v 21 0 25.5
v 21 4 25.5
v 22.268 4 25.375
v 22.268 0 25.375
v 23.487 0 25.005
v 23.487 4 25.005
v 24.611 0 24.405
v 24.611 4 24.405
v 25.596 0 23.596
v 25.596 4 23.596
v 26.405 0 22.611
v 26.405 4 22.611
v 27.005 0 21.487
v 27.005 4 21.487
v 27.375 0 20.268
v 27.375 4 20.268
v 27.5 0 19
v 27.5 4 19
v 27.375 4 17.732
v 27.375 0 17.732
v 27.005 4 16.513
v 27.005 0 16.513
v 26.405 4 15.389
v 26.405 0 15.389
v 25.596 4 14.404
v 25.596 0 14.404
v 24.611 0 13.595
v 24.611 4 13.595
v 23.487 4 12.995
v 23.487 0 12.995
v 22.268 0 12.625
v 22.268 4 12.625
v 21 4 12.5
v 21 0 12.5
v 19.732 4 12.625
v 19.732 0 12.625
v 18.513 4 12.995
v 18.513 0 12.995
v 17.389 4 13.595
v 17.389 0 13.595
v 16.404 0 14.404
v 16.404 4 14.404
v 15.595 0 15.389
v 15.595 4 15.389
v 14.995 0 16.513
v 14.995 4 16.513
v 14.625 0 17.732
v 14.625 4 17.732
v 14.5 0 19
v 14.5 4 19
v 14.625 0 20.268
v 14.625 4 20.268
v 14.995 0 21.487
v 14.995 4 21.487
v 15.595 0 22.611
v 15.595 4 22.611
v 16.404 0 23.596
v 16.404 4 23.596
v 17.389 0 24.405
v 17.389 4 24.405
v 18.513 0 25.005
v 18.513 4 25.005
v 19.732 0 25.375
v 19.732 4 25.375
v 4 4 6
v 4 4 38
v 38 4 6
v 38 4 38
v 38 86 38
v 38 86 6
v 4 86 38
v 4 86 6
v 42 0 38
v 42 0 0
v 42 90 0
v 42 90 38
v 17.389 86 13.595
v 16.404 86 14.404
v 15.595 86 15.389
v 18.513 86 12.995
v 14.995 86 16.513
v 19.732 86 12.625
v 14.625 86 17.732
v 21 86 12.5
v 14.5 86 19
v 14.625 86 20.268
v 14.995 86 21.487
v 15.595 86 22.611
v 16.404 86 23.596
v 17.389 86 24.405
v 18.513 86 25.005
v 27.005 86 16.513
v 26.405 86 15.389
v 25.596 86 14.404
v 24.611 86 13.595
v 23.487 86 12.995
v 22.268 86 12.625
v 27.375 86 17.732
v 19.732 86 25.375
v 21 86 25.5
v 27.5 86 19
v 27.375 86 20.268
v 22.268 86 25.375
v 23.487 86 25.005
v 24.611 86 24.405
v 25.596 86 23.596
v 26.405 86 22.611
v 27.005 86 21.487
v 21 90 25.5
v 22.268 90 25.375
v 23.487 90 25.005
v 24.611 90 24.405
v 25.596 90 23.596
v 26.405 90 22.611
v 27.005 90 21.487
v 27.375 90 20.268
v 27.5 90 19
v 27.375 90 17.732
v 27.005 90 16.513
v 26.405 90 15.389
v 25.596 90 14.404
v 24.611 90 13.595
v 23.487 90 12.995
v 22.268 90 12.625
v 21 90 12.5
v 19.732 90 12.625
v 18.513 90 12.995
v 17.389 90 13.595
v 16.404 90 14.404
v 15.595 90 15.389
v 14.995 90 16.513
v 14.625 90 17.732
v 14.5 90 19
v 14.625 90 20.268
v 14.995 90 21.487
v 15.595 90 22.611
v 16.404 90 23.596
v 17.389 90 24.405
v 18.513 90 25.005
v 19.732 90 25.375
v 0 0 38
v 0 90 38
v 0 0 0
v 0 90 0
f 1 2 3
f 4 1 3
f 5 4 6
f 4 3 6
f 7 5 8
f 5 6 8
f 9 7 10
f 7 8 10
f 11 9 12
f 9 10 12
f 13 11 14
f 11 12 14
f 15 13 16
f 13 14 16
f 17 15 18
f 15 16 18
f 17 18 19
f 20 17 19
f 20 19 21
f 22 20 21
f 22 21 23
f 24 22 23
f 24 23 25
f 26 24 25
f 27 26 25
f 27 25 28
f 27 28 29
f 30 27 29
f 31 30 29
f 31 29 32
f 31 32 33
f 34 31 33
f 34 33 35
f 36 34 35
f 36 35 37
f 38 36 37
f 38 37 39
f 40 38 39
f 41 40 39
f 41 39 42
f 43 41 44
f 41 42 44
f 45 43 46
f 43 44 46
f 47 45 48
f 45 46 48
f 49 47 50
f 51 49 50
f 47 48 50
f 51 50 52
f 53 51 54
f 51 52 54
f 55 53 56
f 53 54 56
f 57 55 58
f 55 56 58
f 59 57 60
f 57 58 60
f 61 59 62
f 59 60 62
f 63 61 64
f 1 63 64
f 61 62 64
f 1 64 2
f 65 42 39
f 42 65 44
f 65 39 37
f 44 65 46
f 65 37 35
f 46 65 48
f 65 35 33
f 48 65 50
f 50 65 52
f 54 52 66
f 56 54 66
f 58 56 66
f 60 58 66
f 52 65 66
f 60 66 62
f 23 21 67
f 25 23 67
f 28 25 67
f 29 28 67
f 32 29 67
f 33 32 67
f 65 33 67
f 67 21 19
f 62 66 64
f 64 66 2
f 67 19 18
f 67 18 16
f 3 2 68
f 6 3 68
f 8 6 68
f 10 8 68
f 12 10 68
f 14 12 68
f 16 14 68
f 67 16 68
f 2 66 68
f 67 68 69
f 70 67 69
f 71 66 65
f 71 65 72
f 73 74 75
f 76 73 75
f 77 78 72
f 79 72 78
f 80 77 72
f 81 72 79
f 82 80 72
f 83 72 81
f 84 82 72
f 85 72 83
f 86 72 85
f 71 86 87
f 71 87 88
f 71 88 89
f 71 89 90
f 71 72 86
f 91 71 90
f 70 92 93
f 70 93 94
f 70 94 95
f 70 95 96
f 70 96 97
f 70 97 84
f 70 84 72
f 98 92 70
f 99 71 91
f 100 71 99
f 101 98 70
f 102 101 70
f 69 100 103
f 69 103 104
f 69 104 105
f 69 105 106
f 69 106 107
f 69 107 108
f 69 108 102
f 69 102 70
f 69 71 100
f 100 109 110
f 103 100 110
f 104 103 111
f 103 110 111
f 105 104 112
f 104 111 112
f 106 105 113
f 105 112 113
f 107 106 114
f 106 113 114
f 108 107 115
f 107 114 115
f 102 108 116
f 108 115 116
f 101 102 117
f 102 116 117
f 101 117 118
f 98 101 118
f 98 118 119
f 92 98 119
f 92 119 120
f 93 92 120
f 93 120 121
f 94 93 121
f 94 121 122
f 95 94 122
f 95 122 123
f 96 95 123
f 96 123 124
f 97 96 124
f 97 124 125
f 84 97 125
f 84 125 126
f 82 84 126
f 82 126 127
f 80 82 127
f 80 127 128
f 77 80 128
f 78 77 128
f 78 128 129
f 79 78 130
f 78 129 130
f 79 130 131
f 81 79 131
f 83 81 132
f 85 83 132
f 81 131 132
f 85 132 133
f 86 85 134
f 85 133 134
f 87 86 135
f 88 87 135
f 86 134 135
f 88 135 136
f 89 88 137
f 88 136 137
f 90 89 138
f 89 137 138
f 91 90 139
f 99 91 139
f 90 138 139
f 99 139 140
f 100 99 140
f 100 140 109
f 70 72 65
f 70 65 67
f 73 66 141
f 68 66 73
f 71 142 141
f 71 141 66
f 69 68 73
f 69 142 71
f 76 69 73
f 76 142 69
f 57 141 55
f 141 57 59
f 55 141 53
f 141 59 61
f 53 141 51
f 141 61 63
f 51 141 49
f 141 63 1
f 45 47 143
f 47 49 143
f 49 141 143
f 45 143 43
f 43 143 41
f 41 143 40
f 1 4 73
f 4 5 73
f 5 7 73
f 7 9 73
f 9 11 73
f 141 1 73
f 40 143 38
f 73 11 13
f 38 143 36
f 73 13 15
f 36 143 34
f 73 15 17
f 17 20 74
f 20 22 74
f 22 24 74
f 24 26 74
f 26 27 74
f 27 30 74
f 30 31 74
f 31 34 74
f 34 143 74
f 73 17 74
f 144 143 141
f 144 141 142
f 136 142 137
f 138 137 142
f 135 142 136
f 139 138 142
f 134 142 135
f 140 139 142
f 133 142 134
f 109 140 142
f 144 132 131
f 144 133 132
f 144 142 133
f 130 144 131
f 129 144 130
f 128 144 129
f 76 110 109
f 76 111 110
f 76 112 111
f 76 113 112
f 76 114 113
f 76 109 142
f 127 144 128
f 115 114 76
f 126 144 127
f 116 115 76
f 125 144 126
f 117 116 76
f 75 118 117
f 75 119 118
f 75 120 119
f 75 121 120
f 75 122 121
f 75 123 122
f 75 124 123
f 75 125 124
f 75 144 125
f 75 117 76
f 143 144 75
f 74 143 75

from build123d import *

# Parameters (mm, degrees)
SKETCH_1_W                = 42
SKETCH_1_H                = 90
HOUSING_ENVELOPE_DEPTH    = 38
SKETCH_2_W                = 34
SKETCH_2_H                = 82
FRONT_ACCESS_WINDOW_DEPTH = 32
SKETCH_3_R                = 6.5
AXIAL_PASSAGE_DEPTH       = 107.339080304


with BuildPart() as part:
    # 草图1 → Housing_envelope (new body)
    with BuildSketch(Plane.XY):
        with Locations((21, 45)):
            Rectangle(SKETCH_1_W, SKETCH_1_H)
    extrude(amount=HOUSING_ENVELOPE_DEPTH)

    # 草图2 → Front_access_window (cut)
    with BuildSketch(Plane.XY.offset(38)):
        with Locations((21, 45)):
            Rectangle(SKETCH_2_W, SKETCH_2_H)
    extrude(amount=-FRONT_ACCESS_WINDOW_DEPTH, mode=Mode.SUBTRACT)

    # 草图3 → Axial_passage (cut, through all)
    with BuildSketch(Plane(origin=(0, 90, 0), x_dir=(1, 0, 0), z_dir=(0, 1, 0))):
        with Locations(Location((21, -19, 0), (0, 0, 270))):
            Circle(SKETCH_3_R)
    extrude(amount=-AXIAL_PASSAGE_DEPTH, mode=Mode.SUBTRACT)


solid = part.part
